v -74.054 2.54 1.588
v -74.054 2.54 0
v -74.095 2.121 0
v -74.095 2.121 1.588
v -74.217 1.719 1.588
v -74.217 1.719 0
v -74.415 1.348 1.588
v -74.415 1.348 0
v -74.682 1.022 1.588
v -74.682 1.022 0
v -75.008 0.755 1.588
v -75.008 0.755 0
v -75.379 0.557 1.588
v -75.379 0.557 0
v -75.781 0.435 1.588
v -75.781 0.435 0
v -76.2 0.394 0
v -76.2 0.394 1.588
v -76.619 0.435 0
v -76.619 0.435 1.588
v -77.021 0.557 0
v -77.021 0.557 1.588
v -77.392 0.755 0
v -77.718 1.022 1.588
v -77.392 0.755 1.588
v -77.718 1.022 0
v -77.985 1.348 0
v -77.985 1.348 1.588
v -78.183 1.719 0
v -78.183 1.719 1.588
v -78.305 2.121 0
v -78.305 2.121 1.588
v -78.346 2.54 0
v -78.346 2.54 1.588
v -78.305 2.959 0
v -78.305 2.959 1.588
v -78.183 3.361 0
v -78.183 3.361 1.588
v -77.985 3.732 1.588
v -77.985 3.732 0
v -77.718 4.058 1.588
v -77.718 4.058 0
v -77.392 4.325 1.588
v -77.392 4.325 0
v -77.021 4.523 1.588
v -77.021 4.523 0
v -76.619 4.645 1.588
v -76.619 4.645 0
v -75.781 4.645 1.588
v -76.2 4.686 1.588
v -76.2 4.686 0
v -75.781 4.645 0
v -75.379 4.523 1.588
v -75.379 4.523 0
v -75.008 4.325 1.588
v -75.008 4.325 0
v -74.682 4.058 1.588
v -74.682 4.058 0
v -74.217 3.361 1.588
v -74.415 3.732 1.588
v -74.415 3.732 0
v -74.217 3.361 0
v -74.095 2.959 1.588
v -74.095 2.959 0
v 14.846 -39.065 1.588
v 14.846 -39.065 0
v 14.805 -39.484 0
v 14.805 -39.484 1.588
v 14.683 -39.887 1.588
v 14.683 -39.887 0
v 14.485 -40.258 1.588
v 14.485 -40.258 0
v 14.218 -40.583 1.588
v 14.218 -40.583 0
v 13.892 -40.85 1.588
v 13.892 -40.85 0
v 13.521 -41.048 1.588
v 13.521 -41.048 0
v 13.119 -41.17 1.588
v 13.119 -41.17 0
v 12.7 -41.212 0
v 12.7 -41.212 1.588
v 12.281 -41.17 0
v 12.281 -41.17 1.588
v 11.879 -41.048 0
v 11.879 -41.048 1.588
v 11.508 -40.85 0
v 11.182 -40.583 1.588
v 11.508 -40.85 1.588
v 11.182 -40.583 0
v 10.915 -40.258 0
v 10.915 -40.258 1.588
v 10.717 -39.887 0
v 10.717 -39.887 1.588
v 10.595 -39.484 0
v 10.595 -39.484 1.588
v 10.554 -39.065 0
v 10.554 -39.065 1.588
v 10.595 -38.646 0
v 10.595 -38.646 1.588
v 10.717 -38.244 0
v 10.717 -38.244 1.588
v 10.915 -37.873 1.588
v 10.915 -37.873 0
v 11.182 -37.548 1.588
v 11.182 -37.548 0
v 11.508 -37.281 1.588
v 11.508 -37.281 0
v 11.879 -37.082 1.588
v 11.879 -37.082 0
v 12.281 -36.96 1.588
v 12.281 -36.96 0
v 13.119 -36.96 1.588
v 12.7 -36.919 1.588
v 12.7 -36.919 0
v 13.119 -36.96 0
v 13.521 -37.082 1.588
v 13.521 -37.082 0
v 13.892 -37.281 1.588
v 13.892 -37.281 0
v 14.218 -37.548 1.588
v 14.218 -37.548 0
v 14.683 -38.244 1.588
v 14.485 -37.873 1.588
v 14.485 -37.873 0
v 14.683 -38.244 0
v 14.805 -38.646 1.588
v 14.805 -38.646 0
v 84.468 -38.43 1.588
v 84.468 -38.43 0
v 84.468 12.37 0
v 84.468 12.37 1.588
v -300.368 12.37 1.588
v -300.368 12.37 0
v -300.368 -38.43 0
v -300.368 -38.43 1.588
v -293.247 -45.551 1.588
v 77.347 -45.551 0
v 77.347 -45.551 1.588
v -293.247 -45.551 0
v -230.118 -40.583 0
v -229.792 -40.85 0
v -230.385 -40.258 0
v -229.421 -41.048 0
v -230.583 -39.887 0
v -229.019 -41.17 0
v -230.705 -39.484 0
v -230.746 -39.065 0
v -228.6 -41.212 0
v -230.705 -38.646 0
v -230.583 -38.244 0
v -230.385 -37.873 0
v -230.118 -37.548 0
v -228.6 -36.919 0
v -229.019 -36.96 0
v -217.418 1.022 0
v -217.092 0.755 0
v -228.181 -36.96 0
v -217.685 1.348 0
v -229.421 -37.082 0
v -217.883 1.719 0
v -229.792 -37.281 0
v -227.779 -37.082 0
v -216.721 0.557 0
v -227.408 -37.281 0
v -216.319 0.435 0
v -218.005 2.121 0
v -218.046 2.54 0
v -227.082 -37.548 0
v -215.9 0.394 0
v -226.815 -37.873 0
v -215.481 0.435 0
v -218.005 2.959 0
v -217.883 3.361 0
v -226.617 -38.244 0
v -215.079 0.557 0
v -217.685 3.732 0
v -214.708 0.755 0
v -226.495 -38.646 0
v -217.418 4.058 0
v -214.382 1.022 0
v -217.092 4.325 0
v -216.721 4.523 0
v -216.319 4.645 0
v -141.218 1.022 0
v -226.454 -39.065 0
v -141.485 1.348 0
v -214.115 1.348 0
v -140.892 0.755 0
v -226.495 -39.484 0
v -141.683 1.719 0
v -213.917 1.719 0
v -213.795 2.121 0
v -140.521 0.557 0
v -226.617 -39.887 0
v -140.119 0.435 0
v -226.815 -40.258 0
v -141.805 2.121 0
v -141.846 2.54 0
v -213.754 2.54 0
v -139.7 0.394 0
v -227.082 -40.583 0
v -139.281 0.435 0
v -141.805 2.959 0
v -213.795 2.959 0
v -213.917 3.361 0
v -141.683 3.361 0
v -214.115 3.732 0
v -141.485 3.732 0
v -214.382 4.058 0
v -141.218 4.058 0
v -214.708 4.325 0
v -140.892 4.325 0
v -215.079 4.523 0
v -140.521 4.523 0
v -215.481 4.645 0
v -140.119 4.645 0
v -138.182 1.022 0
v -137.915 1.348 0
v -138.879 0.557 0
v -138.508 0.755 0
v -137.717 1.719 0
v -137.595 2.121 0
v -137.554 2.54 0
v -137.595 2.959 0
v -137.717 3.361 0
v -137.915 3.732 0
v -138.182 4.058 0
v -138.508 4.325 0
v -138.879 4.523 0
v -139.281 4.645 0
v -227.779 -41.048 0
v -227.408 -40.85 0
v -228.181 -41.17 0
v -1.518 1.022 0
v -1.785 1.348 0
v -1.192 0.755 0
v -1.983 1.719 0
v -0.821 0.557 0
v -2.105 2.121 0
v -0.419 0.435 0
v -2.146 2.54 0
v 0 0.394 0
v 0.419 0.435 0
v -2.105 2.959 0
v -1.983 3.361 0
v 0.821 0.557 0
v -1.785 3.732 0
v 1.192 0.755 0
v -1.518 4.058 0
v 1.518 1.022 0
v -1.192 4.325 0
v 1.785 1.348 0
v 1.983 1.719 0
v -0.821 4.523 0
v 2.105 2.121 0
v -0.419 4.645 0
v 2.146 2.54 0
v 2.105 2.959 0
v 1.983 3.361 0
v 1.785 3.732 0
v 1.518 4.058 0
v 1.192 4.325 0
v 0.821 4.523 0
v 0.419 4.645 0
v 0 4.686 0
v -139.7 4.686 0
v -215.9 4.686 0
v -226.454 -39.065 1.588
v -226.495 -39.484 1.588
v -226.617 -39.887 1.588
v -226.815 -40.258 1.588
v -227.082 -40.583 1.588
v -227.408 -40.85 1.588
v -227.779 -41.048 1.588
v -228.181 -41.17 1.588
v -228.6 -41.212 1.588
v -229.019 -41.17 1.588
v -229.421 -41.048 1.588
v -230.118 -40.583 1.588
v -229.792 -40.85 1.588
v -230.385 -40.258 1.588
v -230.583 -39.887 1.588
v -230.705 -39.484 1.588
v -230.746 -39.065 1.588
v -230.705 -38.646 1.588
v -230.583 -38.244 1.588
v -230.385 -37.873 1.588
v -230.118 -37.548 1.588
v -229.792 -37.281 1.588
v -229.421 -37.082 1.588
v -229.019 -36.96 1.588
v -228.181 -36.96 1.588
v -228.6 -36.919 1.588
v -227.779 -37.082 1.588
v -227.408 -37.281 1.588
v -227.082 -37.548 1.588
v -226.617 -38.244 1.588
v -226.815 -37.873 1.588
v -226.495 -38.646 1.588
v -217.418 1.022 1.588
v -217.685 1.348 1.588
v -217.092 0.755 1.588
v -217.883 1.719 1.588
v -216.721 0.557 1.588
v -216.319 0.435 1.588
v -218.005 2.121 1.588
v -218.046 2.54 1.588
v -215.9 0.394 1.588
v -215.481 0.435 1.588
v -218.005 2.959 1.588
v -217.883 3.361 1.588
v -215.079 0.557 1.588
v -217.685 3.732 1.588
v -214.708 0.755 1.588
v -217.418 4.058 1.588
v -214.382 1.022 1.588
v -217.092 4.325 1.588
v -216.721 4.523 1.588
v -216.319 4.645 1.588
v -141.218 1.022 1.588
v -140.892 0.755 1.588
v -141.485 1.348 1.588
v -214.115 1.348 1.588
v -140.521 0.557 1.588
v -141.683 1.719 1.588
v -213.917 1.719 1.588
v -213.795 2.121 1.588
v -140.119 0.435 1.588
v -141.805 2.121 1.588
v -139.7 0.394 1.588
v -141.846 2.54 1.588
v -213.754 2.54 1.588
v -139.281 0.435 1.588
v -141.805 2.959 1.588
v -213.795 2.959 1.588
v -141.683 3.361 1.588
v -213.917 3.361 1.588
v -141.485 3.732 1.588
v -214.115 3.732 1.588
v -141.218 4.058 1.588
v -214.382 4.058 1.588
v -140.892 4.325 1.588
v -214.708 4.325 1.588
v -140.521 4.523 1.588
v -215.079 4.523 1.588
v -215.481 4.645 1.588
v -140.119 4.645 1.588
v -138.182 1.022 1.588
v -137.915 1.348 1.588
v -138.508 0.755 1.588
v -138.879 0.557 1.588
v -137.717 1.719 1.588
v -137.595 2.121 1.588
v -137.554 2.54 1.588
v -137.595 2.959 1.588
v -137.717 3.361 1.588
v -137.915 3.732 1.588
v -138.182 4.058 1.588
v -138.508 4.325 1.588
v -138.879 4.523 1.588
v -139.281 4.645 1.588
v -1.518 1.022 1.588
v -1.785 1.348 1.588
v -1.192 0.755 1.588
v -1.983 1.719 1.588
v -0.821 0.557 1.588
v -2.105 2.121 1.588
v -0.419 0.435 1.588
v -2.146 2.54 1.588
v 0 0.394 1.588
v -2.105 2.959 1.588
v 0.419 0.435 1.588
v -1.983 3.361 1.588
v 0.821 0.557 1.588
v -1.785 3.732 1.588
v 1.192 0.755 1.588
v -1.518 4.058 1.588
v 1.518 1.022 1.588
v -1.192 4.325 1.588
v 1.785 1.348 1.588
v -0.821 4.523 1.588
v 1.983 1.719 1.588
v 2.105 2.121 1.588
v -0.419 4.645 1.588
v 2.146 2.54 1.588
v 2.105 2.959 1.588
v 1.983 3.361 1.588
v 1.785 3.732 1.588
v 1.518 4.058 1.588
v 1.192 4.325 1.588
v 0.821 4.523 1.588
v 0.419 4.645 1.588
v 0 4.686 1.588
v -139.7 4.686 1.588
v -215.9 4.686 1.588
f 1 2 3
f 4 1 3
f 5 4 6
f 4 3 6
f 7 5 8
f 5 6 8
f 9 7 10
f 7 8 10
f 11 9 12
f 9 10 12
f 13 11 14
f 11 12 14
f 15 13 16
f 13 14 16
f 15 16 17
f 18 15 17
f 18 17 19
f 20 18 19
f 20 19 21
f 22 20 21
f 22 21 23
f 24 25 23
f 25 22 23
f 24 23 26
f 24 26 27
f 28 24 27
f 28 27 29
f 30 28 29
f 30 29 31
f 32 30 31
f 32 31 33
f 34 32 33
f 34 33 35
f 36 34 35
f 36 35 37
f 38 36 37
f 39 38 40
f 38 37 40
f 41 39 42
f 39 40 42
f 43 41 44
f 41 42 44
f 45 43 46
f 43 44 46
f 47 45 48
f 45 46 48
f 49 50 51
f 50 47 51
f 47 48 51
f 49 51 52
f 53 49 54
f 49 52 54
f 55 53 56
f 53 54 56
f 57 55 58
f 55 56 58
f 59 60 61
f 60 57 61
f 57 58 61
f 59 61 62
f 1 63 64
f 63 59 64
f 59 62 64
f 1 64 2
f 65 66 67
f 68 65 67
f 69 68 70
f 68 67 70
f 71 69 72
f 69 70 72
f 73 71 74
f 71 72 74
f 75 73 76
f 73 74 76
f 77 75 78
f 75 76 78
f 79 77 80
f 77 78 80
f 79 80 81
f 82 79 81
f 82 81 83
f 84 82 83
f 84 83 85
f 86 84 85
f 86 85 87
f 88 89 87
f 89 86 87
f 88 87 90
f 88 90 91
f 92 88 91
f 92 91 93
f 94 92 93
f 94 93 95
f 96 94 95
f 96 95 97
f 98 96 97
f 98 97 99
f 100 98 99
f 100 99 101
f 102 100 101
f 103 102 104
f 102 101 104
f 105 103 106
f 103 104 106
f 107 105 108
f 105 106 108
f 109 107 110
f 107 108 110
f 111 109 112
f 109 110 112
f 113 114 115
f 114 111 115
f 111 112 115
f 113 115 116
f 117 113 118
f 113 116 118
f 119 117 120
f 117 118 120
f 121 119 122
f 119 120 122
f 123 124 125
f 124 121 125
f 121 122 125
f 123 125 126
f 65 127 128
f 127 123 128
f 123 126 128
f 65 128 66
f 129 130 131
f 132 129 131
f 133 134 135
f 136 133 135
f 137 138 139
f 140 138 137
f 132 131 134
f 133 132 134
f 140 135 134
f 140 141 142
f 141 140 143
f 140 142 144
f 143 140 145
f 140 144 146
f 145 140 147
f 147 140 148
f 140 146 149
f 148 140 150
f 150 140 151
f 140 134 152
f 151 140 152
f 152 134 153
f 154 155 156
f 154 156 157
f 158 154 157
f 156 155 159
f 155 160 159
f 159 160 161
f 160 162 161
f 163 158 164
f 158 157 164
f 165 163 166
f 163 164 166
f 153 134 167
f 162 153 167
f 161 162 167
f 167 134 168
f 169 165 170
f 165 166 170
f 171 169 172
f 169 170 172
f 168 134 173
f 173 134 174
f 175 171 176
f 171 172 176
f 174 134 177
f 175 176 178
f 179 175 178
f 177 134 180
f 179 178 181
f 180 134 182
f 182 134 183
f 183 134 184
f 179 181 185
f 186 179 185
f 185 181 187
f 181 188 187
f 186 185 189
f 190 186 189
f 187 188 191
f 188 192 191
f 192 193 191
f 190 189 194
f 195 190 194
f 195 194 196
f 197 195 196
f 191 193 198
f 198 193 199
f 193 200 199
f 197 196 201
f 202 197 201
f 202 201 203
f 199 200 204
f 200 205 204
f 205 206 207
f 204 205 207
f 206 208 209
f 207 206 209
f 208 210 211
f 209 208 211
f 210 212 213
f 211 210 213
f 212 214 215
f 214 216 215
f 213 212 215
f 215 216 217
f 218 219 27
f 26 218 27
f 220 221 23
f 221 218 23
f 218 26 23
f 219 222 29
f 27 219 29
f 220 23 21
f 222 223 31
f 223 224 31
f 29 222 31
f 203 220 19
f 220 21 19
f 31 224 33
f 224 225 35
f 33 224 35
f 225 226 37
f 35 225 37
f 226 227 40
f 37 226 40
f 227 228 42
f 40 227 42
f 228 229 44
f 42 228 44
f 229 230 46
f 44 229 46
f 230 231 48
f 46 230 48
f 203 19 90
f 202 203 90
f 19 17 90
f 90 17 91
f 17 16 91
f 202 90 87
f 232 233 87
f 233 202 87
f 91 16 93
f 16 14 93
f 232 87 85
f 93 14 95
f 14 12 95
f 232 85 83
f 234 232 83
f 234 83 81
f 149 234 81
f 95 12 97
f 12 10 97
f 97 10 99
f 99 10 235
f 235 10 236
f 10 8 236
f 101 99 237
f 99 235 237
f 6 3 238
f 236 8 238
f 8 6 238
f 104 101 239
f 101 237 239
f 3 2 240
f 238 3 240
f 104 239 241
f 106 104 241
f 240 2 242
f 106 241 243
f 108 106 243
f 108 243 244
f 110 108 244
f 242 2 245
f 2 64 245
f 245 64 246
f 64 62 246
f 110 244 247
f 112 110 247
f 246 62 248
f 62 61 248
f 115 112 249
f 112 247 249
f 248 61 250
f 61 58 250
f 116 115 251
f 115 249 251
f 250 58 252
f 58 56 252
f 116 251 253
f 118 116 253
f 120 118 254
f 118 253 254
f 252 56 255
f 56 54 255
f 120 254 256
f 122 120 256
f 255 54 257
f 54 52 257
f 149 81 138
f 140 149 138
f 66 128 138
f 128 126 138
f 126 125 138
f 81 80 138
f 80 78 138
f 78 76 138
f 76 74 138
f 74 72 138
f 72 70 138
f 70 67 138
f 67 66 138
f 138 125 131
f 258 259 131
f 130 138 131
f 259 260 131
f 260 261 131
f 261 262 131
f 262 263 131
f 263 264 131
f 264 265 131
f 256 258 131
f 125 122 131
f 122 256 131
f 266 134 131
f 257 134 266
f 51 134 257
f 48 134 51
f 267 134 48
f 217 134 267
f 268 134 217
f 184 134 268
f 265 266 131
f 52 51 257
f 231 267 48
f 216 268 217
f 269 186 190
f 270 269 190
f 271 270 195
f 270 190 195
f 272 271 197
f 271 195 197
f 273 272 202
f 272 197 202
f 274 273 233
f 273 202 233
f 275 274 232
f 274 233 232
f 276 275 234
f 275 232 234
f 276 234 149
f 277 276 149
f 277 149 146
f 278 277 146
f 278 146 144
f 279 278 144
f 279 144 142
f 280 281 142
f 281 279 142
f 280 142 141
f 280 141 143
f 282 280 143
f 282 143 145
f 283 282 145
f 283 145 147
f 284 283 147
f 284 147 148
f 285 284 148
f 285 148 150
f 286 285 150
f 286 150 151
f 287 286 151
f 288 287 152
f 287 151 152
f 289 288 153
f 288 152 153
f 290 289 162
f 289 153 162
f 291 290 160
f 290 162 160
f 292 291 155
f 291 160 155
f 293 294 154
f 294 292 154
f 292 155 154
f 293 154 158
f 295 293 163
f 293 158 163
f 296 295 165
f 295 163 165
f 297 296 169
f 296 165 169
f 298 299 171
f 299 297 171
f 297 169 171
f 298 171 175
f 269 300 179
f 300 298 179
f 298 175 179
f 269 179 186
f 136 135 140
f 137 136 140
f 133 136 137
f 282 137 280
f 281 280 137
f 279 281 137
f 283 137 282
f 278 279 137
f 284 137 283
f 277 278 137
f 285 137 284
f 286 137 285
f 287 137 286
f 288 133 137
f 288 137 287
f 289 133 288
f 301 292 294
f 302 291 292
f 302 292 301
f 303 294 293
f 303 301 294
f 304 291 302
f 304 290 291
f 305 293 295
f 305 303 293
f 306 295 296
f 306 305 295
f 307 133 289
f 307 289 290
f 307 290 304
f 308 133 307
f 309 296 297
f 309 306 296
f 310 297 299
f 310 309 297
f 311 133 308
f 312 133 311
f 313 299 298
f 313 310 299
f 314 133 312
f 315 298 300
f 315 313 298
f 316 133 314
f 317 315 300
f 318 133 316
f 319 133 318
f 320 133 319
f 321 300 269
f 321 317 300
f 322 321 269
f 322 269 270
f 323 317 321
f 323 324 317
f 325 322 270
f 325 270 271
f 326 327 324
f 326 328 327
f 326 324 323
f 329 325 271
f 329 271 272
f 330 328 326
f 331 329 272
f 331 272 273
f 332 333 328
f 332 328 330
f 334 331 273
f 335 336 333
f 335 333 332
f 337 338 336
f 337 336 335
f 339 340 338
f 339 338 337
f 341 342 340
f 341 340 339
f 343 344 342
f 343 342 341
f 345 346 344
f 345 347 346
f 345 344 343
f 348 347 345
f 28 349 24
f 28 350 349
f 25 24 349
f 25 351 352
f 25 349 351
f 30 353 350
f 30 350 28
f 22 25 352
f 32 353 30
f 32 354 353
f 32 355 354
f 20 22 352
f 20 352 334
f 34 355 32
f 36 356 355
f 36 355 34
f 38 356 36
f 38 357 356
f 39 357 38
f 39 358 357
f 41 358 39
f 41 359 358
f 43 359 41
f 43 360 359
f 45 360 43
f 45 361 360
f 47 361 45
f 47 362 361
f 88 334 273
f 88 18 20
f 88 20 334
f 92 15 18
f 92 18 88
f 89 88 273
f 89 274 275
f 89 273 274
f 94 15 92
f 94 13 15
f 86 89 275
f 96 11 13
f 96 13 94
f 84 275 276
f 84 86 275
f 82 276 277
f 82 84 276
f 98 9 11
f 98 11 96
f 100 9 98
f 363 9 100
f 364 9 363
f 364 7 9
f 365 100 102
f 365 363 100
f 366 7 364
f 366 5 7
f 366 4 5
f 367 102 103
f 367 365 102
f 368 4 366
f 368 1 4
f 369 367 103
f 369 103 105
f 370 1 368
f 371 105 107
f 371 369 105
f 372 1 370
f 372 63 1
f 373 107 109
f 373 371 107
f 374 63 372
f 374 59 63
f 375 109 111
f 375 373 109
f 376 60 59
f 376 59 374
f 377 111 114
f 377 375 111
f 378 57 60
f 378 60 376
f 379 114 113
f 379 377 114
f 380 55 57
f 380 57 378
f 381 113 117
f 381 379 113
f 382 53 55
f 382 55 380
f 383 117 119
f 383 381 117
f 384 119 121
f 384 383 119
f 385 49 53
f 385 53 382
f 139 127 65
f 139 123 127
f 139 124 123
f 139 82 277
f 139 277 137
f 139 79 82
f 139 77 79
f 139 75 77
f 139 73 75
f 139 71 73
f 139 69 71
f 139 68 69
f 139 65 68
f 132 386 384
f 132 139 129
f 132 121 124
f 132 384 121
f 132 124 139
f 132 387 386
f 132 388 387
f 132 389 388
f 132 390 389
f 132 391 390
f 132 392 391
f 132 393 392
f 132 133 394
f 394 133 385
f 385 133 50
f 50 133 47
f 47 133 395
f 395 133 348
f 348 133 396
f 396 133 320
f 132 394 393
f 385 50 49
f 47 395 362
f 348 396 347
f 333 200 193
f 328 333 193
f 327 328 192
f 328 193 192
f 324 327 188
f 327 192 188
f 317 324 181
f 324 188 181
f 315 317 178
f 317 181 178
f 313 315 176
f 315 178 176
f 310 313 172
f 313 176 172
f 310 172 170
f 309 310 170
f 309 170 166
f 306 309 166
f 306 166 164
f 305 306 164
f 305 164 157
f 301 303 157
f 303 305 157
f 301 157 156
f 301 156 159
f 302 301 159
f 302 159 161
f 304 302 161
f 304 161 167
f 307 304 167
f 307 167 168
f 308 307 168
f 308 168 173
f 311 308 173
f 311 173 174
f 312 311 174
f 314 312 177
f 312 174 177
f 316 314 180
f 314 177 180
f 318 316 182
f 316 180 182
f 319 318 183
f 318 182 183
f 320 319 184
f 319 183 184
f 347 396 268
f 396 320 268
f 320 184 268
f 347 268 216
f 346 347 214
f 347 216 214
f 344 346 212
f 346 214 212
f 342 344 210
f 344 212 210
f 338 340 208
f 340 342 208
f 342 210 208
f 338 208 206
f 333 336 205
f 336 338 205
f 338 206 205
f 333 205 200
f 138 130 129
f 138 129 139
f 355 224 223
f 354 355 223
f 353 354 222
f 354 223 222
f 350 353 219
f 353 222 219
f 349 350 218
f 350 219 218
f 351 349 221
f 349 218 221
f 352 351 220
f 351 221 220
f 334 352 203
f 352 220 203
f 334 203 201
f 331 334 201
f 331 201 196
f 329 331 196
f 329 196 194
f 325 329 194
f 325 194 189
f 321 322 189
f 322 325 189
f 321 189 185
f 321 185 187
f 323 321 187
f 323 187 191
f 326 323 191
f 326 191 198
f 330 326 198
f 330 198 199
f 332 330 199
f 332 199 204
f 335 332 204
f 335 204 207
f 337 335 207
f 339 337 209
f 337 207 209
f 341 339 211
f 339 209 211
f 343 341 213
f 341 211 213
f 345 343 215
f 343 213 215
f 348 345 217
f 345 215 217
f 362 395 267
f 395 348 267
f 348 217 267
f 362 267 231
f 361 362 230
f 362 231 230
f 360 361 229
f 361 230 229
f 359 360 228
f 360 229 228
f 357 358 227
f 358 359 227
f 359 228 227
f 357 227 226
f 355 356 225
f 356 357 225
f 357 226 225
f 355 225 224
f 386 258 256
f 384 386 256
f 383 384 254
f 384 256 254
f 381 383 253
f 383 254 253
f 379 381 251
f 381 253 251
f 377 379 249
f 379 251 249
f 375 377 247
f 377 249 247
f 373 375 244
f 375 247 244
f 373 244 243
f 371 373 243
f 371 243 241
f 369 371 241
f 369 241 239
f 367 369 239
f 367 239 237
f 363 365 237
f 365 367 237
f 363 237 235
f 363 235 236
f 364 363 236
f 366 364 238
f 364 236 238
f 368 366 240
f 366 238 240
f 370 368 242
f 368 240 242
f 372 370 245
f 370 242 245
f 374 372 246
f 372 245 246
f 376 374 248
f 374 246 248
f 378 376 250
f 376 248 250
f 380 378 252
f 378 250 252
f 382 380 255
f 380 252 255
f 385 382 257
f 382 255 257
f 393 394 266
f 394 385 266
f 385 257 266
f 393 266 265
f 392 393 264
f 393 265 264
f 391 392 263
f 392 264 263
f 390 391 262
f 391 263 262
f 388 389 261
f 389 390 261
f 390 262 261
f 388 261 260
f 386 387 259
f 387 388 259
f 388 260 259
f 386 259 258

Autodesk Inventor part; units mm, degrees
ref_plane "YZ Plane" through (0, 0, 0) normal (1, 0, 0) x (0, 1, 0)
ref_plane "XZ Plane" through (0, 0, 0) normal (0, 1, 0) x (-1, 0, 0)
ref_plane "XY Plane" through (0, 0, 0) normal (0, 0, 1) x (1, 0, 0)
sketch "Sketch1" plane through (0, 0, 0) normal (0, 0, 1) x (1, 0, 0)
  line L0 (84.4677, 12.3696) -> (-300.3677, 12.3696)
  line L1 (-300.3677, 12.3696) -> (-300.3677, -38.4304)
  line L2 (84.4677, -38.4304) -> (84.4677, 12.3696)
  circle A0 centre (0, 2.54) radius 2.1463
  line L3 (84.4677, -38.4304) -> (77.3473, -45.5508)
  line L4 (84.4677, -38.4304) -> (94.5374, -38.4304) construction
  line L5 (-300.3677, -38.4304) -> (-296.831, -38.4304) construction
  line L6 (-300.3677, -38.4304) -> (-293.2473, -45.5508)
  line L7 (-300.3677, -38.4304) -> (-290.298, -38.4304) construction
  line L8 (77.3473, -45.5508) -> (-293.2473, -45.5508)
  circle A1 centre (-215.9, 2.54) radius 2.1463
  circle A2 centre (12.7, -39.0652) radius 2.1463
  circle A3 centre (-228.6, -39.0652) radius 2.1463
  circle A4 centre (-76.2, 2.54) radius 2.1463
  circle A5 centre (-139.7, 2.54) radius 2.1463
  point P0 (0, 0)
  dimension "d0" = 384.8354
  dimension "d1" = 4.2926
  dimension "d2" = 84.4677
  dimension "d3" = 9.8296
  dimension "d4" = 135
  dimension "d5" = 7.1204
  dimension "d6" = 45
  dimension "d7" = 7.1204
  dimension "d8" = 4.2926
  dimension "d9" = 9.8296
  dimension "d10" = 215.9
  dimension "d13" = 4.2926
  dimension "d14" = 71.7677
  dimension "d17" = 51.4348
  dimension "d18" = 4.2926
  dimension "d19" = 51.4348
  dimension "d20" = 71.7677
  dimension "d21" = 50.8
  dimension "d22" = 4.2926
  dimension "d23" = 76.2
  dimension "d24" = 4.2926
  dimension "d25" = 76.2
  dimension "d26" = 9.8296
  dimension "d27" = 9.8296
extrude "Extrusion2" add sketch "Sketch1" along normal blind 1.5875
properties part number "Back Guard"
